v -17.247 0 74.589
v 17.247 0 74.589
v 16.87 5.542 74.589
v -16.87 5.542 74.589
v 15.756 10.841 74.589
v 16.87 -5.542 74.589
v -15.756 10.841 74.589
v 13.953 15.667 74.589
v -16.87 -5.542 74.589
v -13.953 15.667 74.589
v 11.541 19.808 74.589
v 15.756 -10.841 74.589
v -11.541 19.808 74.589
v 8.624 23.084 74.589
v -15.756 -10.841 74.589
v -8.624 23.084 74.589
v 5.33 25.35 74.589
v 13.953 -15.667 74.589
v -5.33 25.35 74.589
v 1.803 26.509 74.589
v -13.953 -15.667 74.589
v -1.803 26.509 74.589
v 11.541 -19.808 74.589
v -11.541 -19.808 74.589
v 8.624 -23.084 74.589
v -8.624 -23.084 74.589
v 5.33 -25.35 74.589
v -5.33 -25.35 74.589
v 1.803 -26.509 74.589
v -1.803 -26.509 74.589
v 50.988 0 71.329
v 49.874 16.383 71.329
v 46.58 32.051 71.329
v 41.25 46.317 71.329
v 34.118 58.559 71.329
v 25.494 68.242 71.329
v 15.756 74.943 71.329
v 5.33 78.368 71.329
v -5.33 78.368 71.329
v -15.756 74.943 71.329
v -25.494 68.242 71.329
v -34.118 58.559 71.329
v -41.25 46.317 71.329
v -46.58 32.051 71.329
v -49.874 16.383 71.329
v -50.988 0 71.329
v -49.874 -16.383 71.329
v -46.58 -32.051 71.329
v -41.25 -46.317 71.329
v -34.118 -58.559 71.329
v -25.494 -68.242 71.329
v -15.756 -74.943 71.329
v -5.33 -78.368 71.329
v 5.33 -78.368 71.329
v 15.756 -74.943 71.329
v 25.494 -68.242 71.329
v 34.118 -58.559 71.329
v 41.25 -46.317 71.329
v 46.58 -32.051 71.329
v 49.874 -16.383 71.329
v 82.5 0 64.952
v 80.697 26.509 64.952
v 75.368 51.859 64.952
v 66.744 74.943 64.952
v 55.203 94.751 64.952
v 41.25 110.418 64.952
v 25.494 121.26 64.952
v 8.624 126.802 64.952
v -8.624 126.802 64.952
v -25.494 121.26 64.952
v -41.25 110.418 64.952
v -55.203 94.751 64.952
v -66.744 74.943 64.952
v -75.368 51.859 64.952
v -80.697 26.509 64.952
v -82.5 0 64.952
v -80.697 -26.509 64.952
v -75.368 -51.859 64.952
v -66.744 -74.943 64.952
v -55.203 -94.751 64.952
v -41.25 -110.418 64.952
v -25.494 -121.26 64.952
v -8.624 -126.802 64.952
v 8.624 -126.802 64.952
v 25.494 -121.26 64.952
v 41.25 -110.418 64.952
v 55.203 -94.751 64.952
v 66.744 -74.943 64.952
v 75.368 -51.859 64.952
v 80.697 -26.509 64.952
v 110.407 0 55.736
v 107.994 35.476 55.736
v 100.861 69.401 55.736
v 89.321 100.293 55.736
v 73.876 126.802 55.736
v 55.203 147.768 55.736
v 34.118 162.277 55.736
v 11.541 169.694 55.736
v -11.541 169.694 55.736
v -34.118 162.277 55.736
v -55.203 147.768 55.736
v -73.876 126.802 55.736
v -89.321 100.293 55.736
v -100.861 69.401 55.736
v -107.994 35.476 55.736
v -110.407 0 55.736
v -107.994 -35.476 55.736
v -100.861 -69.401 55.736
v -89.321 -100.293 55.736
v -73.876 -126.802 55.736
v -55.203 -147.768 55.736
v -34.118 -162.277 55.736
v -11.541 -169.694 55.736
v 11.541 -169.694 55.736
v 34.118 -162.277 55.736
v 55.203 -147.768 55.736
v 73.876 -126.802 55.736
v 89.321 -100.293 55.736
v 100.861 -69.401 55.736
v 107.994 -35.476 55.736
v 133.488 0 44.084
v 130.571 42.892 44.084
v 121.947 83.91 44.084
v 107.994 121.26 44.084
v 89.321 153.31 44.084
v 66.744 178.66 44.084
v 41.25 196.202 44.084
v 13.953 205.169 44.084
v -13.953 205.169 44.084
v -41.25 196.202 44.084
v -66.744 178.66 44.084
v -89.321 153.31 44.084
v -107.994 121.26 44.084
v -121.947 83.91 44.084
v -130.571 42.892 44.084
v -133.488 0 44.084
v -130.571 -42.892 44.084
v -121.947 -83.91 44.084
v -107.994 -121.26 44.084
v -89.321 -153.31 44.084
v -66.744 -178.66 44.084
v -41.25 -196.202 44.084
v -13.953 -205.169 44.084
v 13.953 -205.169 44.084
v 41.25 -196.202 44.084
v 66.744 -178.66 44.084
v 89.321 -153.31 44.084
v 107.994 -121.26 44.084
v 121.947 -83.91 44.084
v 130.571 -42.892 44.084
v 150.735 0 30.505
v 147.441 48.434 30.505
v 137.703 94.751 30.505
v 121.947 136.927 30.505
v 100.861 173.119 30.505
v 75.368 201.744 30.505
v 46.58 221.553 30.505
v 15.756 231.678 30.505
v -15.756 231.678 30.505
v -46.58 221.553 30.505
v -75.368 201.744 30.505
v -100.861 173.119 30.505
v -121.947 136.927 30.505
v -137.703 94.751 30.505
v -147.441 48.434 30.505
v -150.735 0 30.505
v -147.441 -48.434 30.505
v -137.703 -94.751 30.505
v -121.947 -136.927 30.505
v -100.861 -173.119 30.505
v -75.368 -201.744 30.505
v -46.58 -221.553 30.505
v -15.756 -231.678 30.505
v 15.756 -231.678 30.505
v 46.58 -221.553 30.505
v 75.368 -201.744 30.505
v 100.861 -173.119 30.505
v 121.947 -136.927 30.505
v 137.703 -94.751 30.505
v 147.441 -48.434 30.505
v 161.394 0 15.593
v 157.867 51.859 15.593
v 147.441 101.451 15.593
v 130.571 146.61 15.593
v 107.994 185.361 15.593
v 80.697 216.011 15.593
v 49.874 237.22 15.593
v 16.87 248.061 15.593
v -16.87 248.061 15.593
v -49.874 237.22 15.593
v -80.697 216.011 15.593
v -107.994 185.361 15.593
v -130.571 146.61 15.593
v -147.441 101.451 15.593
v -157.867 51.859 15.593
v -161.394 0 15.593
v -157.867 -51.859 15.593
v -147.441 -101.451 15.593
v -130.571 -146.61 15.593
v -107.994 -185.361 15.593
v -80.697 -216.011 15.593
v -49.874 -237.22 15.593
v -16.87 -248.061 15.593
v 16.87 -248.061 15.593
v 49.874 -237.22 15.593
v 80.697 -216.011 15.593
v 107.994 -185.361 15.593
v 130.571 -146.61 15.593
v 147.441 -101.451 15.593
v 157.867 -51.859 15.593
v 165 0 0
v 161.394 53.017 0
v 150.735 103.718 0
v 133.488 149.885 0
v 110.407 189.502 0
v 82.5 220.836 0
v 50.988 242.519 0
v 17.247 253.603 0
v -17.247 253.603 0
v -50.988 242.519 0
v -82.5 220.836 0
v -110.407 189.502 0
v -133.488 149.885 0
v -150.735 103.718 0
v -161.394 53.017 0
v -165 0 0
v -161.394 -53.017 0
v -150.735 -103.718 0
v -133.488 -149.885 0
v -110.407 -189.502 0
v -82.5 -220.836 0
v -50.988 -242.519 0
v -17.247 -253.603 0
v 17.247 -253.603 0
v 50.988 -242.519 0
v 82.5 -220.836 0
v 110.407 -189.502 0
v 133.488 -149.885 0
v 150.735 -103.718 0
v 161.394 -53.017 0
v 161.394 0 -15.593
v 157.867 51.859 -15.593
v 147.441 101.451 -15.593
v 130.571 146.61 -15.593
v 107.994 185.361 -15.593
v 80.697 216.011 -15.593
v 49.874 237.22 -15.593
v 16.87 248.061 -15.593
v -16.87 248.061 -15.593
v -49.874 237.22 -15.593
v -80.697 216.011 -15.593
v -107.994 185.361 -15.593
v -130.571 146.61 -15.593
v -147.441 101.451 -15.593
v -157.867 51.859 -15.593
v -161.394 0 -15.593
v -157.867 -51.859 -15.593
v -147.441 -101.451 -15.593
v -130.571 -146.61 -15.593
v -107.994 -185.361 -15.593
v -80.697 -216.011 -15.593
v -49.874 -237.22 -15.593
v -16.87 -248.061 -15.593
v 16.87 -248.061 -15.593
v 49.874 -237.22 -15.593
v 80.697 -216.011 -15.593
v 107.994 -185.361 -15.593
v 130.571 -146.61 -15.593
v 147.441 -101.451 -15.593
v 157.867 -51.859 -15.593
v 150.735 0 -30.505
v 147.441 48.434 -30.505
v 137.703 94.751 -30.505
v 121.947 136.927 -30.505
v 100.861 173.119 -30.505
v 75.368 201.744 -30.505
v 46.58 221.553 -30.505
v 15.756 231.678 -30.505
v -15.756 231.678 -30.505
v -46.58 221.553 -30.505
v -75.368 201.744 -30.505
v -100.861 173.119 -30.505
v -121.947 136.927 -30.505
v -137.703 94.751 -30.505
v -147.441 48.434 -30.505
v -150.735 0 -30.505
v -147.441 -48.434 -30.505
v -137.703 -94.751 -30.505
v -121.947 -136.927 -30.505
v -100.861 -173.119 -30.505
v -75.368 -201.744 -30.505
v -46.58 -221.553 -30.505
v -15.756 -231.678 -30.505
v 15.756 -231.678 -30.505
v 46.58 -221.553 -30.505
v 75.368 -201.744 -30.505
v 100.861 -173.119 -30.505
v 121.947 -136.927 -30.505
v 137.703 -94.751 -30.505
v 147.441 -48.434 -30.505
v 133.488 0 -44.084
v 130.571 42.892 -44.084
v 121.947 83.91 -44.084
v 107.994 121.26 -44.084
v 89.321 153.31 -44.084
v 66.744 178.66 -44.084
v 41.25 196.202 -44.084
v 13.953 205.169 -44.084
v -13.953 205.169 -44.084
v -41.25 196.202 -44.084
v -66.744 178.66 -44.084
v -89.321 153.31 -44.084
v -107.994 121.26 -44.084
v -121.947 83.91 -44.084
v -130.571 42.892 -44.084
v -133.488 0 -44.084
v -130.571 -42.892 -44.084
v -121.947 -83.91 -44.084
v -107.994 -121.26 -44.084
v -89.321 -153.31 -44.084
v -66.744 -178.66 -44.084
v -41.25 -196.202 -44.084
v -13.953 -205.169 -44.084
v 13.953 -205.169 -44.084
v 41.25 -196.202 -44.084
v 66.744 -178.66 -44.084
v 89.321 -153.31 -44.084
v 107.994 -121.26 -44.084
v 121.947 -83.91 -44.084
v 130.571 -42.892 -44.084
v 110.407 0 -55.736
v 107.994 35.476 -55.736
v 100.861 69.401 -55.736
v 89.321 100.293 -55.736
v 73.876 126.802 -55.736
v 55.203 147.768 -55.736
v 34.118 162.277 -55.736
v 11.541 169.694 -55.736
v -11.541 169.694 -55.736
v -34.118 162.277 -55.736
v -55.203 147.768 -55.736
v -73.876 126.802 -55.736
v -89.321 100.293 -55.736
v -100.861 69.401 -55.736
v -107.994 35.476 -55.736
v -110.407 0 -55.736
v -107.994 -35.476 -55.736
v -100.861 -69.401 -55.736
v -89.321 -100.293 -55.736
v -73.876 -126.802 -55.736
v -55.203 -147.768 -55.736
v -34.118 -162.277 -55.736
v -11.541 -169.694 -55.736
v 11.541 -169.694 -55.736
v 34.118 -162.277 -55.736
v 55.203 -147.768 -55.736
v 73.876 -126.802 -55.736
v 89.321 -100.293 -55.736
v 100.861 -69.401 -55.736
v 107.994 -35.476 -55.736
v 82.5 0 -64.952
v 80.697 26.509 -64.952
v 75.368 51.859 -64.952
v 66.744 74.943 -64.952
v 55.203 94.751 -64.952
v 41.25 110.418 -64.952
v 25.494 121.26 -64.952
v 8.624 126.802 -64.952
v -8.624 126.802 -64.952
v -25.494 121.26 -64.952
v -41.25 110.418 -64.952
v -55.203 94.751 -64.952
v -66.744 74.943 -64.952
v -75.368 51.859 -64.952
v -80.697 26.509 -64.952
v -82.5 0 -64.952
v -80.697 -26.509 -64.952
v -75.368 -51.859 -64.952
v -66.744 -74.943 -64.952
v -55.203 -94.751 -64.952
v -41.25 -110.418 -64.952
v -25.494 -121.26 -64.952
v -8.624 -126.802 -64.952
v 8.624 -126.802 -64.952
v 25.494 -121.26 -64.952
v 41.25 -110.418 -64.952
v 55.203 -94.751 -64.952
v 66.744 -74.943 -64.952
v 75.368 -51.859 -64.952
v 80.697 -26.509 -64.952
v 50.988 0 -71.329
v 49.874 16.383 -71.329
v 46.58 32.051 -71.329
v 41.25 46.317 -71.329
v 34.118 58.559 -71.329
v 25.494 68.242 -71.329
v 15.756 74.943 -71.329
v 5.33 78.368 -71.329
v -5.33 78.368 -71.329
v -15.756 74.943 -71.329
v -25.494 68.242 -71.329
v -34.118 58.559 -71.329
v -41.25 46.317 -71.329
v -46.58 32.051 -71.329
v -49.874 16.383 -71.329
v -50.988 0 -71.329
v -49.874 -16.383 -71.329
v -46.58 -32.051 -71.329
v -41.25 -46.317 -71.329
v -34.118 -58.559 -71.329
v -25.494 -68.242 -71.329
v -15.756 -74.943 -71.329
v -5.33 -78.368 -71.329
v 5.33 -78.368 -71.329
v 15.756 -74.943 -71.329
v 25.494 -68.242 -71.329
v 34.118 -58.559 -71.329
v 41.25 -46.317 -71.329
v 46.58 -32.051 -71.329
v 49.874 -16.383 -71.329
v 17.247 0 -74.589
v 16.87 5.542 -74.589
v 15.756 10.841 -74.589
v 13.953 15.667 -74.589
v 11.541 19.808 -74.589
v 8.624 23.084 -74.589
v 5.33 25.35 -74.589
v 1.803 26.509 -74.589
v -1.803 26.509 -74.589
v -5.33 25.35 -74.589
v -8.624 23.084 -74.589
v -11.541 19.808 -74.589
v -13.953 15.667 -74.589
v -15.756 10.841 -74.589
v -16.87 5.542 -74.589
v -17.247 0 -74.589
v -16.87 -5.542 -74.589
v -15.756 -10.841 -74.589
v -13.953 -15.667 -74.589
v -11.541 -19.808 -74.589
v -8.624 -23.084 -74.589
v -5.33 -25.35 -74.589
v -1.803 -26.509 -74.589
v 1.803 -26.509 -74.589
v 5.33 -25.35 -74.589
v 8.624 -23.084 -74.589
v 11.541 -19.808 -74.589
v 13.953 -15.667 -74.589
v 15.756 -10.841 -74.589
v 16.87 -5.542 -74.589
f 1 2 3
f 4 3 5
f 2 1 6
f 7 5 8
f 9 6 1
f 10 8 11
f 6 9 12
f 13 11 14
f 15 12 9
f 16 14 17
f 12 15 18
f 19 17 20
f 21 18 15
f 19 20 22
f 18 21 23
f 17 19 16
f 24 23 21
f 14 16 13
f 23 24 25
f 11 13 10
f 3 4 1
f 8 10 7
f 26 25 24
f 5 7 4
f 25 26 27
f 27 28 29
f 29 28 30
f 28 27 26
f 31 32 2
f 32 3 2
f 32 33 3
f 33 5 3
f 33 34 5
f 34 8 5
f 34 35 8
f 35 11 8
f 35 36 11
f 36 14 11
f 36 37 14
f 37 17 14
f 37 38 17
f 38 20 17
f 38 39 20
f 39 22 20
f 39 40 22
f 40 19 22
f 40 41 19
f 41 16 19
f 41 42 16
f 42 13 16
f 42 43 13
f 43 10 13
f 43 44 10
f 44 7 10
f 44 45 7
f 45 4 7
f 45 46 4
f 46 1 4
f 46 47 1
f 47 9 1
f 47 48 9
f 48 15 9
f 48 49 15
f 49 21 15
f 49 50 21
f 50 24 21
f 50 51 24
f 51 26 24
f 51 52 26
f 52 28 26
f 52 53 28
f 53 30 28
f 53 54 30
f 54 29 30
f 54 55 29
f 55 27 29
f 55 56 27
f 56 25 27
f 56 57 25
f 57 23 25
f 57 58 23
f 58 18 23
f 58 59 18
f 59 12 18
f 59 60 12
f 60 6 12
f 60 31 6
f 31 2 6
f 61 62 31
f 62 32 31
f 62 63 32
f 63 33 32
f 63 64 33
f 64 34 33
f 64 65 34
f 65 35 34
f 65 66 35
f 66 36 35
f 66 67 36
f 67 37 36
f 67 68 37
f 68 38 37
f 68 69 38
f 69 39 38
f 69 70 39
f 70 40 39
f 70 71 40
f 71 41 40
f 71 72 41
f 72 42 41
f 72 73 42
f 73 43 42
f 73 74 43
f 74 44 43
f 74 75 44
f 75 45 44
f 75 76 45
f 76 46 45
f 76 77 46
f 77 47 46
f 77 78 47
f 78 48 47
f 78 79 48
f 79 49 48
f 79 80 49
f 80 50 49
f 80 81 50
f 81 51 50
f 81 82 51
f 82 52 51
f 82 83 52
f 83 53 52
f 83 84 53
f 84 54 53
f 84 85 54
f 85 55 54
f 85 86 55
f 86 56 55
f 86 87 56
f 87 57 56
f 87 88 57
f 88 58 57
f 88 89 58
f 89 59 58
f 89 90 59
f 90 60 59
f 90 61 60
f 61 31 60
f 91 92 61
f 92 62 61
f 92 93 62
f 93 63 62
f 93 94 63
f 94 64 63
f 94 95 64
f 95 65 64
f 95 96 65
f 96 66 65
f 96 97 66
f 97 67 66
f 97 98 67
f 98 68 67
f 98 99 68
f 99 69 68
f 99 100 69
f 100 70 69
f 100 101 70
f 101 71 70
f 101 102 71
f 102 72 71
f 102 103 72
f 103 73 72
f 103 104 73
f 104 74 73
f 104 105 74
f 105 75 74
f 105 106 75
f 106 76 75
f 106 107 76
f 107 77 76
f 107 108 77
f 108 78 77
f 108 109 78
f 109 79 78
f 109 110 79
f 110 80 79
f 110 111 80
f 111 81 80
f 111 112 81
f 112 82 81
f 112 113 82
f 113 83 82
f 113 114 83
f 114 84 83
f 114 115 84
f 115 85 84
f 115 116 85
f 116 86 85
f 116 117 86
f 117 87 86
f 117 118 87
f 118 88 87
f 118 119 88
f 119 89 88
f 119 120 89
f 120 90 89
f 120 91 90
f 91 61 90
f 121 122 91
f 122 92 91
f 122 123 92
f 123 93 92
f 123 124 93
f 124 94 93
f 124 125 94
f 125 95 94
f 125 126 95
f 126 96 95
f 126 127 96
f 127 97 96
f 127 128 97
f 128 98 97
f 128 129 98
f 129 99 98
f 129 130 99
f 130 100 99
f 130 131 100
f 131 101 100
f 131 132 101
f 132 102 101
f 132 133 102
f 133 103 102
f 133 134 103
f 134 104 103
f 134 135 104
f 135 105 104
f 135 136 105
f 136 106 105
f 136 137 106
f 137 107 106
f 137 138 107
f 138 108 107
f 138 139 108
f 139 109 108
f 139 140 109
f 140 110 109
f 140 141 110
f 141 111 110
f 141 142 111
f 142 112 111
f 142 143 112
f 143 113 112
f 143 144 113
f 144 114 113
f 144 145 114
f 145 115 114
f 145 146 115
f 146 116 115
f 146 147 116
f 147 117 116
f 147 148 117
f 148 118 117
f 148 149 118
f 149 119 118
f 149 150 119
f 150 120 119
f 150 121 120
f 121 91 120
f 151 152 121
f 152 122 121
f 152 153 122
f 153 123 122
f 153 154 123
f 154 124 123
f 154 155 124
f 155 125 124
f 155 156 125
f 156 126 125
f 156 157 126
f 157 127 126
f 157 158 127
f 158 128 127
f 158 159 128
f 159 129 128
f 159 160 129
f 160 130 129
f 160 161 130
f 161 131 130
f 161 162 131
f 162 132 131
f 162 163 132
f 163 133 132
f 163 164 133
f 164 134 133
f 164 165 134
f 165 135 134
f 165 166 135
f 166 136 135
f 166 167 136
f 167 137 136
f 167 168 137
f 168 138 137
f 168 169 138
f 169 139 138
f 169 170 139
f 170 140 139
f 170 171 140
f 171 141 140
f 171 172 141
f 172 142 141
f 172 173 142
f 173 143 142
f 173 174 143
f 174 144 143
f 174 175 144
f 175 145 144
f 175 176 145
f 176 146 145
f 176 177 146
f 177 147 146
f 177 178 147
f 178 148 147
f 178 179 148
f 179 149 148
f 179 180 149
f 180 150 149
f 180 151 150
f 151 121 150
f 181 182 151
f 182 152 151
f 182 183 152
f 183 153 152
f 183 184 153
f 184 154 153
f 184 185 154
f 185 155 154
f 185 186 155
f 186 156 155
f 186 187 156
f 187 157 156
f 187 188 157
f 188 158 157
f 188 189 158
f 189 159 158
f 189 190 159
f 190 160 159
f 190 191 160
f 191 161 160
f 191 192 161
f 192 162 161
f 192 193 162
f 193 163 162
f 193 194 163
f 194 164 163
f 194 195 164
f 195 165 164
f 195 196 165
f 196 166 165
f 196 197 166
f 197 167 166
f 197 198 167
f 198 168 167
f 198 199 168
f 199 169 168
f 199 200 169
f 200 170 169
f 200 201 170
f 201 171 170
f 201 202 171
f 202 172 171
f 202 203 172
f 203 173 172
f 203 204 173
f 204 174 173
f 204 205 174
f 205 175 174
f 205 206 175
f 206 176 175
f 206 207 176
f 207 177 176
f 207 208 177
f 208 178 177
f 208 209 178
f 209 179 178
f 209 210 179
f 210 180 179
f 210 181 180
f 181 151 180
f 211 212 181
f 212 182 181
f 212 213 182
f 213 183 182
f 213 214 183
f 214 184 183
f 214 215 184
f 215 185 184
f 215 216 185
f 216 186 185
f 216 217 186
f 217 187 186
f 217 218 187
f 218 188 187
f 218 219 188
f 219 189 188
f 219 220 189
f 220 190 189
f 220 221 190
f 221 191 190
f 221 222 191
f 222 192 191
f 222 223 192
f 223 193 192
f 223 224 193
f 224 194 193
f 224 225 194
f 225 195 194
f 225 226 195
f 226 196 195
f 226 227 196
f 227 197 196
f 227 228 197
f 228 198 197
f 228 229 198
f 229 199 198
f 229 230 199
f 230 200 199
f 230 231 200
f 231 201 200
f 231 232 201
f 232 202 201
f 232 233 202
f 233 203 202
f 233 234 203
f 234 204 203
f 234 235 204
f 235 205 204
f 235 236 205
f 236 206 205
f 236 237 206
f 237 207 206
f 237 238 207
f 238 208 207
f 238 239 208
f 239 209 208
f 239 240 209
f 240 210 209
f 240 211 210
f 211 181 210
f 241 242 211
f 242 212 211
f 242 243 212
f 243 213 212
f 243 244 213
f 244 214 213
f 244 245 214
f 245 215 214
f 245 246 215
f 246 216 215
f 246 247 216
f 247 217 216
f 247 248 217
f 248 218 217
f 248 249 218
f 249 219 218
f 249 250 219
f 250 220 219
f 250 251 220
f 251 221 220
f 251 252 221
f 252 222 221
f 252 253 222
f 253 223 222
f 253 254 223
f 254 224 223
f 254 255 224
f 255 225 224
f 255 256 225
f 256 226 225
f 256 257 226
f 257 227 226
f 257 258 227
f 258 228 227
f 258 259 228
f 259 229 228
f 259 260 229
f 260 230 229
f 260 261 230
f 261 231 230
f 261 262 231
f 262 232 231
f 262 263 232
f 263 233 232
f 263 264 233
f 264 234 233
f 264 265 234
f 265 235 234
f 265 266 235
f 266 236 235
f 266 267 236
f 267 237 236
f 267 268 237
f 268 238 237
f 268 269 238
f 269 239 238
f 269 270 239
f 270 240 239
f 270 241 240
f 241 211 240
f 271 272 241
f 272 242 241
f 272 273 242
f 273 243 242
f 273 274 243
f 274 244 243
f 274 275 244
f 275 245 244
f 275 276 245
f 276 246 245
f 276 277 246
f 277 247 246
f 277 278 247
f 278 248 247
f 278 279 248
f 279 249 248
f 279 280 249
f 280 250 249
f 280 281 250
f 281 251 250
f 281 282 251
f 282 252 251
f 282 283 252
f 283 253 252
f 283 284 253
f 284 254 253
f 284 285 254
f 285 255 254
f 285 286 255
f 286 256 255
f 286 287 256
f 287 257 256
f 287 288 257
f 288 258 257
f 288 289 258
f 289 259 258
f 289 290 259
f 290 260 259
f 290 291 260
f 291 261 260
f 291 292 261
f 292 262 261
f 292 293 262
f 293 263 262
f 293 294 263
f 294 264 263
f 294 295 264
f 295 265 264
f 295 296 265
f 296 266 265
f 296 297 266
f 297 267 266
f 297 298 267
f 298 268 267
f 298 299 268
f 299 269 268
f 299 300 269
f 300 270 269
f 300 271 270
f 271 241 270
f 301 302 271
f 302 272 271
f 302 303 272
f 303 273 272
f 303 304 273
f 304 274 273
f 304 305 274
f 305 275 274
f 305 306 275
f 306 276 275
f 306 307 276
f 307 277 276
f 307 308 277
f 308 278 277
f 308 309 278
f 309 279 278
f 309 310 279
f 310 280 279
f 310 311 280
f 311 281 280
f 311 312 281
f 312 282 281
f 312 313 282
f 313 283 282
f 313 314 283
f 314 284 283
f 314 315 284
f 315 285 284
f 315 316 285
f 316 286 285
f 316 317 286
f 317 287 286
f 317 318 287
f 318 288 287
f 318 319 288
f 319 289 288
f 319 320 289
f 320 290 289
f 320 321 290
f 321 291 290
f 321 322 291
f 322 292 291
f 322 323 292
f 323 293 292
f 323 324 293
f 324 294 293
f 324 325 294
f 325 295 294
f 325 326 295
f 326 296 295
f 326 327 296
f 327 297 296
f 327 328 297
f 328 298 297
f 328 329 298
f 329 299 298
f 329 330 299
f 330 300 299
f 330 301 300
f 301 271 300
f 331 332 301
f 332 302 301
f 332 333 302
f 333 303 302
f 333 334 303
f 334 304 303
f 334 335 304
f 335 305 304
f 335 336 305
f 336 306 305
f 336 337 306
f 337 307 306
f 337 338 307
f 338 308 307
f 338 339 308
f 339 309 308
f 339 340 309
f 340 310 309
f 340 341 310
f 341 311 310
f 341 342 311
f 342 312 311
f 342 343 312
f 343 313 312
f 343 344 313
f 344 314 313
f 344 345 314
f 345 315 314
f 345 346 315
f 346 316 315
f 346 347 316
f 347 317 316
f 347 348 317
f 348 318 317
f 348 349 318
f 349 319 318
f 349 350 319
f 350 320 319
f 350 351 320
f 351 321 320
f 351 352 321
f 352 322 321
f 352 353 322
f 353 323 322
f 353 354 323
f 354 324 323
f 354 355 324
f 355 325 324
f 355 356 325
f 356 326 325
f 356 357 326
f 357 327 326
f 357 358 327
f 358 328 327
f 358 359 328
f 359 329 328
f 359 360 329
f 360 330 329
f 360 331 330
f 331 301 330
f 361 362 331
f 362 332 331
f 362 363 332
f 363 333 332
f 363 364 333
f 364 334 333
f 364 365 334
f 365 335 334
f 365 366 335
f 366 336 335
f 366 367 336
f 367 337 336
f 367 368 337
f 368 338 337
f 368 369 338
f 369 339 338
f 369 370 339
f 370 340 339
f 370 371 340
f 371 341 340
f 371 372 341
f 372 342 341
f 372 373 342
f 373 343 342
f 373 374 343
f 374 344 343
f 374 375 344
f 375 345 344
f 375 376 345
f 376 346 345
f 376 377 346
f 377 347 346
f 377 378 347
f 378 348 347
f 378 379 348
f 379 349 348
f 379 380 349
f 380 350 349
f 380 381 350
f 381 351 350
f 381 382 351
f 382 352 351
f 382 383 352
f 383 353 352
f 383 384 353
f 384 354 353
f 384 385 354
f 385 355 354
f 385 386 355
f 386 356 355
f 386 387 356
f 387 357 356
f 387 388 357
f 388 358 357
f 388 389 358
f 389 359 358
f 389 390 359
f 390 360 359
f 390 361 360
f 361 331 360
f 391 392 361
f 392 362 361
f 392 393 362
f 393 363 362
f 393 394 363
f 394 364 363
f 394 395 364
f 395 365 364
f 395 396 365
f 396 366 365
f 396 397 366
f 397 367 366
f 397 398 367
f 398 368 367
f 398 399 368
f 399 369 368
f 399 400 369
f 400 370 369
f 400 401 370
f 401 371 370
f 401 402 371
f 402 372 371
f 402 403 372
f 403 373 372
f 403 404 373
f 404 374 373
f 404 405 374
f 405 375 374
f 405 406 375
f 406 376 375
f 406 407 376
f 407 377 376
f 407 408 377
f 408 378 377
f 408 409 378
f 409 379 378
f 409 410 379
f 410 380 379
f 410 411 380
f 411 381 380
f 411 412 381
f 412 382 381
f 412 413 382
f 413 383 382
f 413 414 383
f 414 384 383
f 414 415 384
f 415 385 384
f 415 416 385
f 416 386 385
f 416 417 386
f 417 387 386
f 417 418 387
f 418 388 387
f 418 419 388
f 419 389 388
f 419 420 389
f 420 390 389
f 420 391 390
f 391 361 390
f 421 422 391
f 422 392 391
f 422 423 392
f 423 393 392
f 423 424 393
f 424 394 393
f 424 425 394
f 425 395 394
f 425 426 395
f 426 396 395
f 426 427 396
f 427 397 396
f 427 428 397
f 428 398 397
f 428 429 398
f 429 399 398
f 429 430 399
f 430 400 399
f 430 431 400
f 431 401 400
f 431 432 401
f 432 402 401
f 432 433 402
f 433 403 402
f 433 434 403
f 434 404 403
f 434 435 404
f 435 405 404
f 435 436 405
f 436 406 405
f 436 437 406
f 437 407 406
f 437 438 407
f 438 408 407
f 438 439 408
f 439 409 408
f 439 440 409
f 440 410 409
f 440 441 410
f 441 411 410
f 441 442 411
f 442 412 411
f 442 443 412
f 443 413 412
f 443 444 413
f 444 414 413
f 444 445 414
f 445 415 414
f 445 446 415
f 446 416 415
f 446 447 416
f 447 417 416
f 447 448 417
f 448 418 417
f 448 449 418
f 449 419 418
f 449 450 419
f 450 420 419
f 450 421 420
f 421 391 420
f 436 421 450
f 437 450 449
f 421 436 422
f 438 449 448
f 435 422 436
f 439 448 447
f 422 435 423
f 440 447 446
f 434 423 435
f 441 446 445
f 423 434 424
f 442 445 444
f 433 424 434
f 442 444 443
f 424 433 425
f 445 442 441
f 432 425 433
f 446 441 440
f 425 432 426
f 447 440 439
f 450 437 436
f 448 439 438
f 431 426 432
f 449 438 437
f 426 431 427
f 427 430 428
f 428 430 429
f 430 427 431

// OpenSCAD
// Generated by SolidPython 1.0.1 on 2020-07-29 00:46:50


scale(v = [11, 17, 5]) {
	sphere(r = 15);
}
/***********************************************
*********      SolidPython code:      **********
************************************************
 
# import packages: SolidPython
from solid import *
from solid.utils import *
from itertools import chain, combinations, permutations


class Resize:

    def __init__(self, scad_file):
        self.scad_file = scad_file
        #self.scad_file = import_scad(scad_file)
        # cone/cylinder param:
        self.r1 = 0
        self.r2 = 0
        self.h = 0
        # rectangular prism param:
        self.w = 0
        self.l = 0
        # ellipse param:
        self.r = 0

    # import OpenScad code (file name corresponds to shape)


    # classify shape + parameters
    def assign(self, param1, param2, param3):
        if self.scad_file == 'cone.scad':
            self.r1 = param1
            self.r2 = param2
            self.h = param3
        elif self.scad_file == 'cylinder.scad':
            self.r1 = param1
            self.r2 = param2
            self.h = param3
        elif self.scad_file == 'rectangularPrism.scad':
            self.h = param1
            self.l = param2
            self.w = param3
        else:
            self.r = param1
            self.h = param2

    # resize parameters
    def iterate(self):
        x = range(3, 20, 2)
        i = 1
        if self.scad_file == 'cone.scad':
            tempList = list(permutations(x, 2))
            for temp in tempList:
                param1 = temp[0]
                param2 = temp[1]
                filepath = 'produced_scad_files/' + 'cone' + str(param1) + '_' + str(param2) + '_' + '.scad'
                scad_render_to_file(cylinder(h=param1, r1=param2, r2=0), filepath)

        elif self.scad_file == 'cylinder.scad':
            tempList = list(permutations(x, 3))
            for temp in tempList:
                param1 = temp[0]
                param2 = temp[1]
                filepath = 'produced_scad_files/' + 'cylinder' + str(param1) + '_' + str(param2) + '_' + '.scad'
                scad_render_to_file(cylinder(h=param1, r1=param2, r2=param2), filepath)

        elif self.scad_file == 'rectangularPrism.scad':
            tempList = list(permutations(x, 3))
            for temp in tempList:
                param1 = temp[0]
                param2 = temp[1]
                param3 = temp[2]
                filepath = 'produced_scad_files/' + 'rectangularPrism' + str(param1) + '_' + str(param2) + '_' + str(
                    param3) + '.scad'
                scad_render_to_file(cube(size=(param1, param2, param3)), filepath)

        elif self.scad_file == 'ellipse.scad':
            tempList = list(permutations(x, 4))
            for temp in tempList:
                param1 = temp[0]
                param2 = temp[1]
                param3 = temp[2]
                param4 = temp[3]
                filepath = 'produced_scad_files/' + 'ellipse' + str(param1) + '_' + str(param2) + '_' + str(param3) + '_' + str(param4) + '.scad'
                scad_render_to_file(scale([param1, param2, param3])(sphere(r=param4)), filepath)

    def render_to_scadfile(self):
        scad_render_to_file(scad, 'example.scad') 
 
************************************************/
